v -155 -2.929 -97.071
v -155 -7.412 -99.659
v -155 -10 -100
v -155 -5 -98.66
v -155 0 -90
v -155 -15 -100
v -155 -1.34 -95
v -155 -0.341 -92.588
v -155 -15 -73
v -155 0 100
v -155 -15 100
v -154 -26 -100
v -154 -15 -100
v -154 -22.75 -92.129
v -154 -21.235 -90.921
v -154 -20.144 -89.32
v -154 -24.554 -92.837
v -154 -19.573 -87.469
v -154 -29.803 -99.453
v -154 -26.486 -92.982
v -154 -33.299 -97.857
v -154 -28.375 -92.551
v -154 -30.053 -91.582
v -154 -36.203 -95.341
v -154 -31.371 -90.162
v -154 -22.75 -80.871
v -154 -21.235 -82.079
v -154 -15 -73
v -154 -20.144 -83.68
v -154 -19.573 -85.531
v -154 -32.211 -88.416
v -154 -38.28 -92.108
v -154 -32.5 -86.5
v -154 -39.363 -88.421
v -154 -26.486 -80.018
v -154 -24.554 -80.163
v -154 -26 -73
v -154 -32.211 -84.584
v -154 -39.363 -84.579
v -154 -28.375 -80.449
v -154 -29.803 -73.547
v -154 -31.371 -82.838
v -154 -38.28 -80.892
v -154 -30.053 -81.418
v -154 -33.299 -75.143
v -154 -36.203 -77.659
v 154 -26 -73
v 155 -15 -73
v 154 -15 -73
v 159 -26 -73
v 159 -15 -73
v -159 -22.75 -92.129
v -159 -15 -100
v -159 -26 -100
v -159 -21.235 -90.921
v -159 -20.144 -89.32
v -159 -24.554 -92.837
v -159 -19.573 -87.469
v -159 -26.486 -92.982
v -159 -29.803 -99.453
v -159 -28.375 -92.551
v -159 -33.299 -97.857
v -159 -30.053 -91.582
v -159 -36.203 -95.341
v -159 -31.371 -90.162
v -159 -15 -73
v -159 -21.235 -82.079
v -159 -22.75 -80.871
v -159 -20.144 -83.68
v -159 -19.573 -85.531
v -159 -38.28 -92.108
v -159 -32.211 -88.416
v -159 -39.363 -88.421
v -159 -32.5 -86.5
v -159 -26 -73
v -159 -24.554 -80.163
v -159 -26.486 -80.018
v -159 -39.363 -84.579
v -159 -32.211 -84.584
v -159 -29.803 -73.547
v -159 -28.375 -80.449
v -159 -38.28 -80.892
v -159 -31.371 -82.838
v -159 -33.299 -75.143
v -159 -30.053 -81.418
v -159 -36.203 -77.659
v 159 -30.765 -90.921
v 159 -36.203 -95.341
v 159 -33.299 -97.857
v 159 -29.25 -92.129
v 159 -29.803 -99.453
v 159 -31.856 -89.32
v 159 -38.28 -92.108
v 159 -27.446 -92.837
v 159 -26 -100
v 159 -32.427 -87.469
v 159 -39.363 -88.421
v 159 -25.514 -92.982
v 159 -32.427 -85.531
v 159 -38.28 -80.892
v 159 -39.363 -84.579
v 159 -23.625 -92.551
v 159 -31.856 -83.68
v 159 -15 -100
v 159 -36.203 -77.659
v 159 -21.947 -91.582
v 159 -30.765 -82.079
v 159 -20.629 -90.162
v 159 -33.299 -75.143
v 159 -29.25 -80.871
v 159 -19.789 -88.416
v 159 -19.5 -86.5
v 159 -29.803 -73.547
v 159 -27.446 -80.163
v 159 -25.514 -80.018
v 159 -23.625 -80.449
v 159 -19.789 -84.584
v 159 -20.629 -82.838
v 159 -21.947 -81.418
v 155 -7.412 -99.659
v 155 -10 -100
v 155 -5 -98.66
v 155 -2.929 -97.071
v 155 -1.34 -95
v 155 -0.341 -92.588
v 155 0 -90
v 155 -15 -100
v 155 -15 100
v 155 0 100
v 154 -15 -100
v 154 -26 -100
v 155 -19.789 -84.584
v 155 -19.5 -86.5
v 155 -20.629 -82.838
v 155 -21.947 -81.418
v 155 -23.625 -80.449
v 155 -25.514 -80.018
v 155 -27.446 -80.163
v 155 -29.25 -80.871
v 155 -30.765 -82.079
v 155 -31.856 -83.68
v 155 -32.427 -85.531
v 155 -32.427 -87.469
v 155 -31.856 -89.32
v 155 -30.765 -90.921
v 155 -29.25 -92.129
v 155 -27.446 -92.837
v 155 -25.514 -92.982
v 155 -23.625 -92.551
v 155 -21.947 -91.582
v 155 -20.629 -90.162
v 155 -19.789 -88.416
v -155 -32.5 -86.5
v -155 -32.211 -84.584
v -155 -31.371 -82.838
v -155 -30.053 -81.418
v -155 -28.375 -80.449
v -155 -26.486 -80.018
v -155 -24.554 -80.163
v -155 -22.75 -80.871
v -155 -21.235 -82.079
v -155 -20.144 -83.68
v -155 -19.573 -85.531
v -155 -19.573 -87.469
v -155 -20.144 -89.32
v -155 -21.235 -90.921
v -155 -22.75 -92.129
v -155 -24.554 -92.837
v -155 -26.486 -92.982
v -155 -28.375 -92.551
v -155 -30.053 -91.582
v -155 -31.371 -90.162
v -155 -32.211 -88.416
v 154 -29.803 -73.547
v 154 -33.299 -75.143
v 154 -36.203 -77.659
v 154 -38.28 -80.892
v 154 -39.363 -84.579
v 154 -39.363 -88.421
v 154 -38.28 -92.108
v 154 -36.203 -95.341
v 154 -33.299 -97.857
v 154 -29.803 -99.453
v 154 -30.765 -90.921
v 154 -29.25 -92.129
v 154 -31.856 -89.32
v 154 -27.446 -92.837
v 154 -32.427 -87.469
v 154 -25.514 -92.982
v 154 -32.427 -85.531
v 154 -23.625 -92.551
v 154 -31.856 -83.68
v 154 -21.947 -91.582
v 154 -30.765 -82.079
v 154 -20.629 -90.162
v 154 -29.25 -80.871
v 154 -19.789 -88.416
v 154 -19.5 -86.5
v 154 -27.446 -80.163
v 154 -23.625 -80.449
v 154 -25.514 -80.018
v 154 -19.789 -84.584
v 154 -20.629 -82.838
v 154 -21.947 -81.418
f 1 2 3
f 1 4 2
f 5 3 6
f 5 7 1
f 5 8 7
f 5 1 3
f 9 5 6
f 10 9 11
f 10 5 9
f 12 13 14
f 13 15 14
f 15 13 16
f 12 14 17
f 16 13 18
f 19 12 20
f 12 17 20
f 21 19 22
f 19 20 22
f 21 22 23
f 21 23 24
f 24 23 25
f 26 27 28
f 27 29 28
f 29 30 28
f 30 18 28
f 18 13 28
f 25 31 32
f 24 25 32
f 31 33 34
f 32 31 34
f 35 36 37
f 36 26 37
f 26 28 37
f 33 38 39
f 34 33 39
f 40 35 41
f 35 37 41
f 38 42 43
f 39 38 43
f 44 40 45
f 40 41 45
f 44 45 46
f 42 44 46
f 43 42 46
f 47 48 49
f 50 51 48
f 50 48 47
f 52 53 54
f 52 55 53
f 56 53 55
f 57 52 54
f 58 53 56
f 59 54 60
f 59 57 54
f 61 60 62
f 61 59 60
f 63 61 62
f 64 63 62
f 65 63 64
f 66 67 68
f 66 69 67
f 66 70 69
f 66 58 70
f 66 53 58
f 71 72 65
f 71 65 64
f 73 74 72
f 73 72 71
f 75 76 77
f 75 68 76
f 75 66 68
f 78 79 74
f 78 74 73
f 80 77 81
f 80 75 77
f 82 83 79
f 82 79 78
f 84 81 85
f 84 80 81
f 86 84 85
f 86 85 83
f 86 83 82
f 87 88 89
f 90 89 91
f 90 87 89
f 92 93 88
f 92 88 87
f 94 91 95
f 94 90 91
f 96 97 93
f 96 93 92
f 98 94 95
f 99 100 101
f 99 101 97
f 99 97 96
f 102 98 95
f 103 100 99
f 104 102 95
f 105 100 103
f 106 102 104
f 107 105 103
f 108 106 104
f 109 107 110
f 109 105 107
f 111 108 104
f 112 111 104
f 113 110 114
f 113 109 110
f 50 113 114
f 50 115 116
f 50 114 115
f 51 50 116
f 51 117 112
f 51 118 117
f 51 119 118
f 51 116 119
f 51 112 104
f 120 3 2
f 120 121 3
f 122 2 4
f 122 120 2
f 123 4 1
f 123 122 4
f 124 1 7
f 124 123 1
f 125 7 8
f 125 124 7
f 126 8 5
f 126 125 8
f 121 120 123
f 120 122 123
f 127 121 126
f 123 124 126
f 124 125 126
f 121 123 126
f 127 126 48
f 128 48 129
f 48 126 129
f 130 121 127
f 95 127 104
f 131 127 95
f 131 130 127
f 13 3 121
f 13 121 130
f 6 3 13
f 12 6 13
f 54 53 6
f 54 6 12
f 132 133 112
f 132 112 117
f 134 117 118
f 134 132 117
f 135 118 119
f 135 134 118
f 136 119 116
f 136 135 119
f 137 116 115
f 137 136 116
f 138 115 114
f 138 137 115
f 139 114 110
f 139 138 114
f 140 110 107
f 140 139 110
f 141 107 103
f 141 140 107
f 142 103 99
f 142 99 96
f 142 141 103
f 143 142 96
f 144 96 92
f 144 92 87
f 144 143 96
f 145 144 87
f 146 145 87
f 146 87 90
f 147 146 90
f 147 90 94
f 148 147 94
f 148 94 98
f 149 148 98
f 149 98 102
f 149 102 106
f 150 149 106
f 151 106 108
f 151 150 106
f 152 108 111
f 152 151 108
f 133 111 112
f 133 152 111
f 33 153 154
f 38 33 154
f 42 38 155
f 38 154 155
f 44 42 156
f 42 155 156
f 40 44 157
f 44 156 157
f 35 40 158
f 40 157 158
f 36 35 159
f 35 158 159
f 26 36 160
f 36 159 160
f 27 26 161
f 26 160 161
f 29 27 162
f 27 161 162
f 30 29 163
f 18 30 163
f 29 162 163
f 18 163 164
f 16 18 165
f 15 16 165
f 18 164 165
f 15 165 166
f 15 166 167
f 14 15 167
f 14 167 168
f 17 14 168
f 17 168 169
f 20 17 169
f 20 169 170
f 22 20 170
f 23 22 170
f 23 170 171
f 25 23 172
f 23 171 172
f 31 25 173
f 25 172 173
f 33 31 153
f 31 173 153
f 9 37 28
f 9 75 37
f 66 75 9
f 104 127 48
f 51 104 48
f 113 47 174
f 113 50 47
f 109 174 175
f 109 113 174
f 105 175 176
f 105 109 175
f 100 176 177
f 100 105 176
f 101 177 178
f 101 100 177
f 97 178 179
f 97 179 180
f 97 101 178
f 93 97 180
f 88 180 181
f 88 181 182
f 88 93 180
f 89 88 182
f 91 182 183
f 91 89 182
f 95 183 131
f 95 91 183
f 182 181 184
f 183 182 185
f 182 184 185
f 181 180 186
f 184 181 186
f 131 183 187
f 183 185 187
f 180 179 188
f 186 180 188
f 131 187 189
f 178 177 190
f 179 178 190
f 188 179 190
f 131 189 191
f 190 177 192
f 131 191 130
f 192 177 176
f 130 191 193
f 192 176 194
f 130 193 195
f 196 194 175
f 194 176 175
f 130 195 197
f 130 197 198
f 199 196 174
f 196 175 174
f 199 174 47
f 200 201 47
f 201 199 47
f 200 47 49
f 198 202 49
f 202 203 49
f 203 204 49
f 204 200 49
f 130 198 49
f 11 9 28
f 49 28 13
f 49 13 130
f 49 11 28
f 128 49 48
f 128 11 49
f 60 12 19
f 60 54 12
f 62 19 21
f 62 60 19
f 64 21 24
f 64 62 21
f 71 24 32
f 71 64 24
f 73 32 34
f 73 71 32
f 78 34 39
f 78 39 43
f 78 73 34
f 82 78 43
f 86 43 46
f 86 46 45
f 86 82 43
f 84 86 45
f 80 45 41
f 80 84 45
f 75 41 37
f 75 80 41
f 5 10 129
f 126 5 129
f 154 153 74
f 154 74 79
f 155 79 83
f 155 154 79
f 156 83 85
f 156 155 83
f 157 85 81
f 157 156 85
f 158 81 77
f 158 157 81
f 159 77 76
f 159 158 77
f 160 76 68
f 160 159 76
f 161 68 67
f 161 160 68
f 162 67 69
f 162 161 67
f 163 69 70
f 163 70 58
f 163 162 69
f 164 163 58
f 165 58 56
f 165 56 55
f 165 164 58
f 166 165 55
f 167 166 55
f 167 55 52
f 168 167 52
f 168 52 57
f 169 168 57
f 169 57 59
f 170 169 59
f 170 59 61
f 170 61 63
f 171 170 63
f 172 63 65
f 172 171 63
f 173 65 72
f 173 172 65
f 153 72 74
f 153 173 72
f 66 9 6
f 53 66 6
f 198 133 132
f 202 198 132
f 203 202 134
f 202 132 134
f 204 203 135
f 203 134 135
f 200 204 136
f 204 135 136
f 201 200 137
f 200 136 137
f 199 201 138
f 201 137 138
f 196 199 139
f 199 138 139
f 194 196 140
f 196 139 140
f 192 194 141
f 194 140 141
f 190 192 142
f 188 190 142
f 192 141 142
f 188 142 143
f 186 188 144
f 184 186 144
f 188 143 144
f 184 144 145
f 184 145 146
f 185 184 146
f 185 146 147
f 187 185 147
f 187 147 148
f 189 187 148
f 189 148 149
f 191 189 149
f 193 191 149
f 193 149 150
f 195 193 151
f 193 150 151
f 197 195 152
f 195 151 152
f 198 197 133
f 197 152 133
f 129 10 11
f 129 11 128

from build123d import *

# Parameters (mm, degrees)
F0_W          = 310
F0_H          = 200
F1_DEPTH      = 15
F3_R          = 10
F2_R          = 6.5
F4_DEPTH      = 4
F4_DEPTH_BACK = 1
F5_R          = 6.5
F6_DEPTH      = 4
F6_DEPTH_BACK = 1


with BuildPart() as f1:
    # F0 (on Front) → F1 (new body)
    with BuildSketch(Plane.XZ):
        Rectangle(F0_W, F0_H)
    extrude(amount=F1_DEPTH)

    # F3
    f3_edges = [f1.edges().sort_by_distance(p)[0] for p in [
        (0, 0, -100),
    ]]
    fillet(f3_edges, radius=F3_R)

    # F2 (on face) → F4 (join, two sides)
    with BuildSketch(Plane.YZ.offset(155)) as f4_sk:
        with BuildLine():
            Line((-26, -100), (-15, -100))
            Line((-15, -100), (-15, -73))
            Line((-15, -73), (-26, -73))
            ThreePointArc((-26, -73), (-39.5, -86.5), (-26, -100))
        make_face()
        with Locations((-26, -86.5)):
            Circle(F2_R, mode=Mode.SUBTRACT)
    extrude(amount=F4_DEPTH)
    extrude(f4_sk.sketch, amount=-F4_DEPTH_BACK)

    # F5 (on face) → F6 (join, two sides)
    with BuildSketch(Plane(origin=(-155, 0, 0), x_dir=(0, -1, 0), z_dir=(-1, 0, 0))) as f6_sk:
        with BuildLine():
            Line((26, -73), (15, -73))
            Line((15, -73), (15, -100))
            Line((15, -100), (26, -100))
            ThreePointArc((26, -100), (39.5, -86.5), (26, -73))
        make_face()
        with Locations((26, -86.5)):
            Circle(F5_R, mode=Mode.SUBTRACT)
    extrude(amount=F6_DEPTH)
    extrude(f6_sk.sketch, amount=-F6_DEPTH_BACK)


solid = f1.part
